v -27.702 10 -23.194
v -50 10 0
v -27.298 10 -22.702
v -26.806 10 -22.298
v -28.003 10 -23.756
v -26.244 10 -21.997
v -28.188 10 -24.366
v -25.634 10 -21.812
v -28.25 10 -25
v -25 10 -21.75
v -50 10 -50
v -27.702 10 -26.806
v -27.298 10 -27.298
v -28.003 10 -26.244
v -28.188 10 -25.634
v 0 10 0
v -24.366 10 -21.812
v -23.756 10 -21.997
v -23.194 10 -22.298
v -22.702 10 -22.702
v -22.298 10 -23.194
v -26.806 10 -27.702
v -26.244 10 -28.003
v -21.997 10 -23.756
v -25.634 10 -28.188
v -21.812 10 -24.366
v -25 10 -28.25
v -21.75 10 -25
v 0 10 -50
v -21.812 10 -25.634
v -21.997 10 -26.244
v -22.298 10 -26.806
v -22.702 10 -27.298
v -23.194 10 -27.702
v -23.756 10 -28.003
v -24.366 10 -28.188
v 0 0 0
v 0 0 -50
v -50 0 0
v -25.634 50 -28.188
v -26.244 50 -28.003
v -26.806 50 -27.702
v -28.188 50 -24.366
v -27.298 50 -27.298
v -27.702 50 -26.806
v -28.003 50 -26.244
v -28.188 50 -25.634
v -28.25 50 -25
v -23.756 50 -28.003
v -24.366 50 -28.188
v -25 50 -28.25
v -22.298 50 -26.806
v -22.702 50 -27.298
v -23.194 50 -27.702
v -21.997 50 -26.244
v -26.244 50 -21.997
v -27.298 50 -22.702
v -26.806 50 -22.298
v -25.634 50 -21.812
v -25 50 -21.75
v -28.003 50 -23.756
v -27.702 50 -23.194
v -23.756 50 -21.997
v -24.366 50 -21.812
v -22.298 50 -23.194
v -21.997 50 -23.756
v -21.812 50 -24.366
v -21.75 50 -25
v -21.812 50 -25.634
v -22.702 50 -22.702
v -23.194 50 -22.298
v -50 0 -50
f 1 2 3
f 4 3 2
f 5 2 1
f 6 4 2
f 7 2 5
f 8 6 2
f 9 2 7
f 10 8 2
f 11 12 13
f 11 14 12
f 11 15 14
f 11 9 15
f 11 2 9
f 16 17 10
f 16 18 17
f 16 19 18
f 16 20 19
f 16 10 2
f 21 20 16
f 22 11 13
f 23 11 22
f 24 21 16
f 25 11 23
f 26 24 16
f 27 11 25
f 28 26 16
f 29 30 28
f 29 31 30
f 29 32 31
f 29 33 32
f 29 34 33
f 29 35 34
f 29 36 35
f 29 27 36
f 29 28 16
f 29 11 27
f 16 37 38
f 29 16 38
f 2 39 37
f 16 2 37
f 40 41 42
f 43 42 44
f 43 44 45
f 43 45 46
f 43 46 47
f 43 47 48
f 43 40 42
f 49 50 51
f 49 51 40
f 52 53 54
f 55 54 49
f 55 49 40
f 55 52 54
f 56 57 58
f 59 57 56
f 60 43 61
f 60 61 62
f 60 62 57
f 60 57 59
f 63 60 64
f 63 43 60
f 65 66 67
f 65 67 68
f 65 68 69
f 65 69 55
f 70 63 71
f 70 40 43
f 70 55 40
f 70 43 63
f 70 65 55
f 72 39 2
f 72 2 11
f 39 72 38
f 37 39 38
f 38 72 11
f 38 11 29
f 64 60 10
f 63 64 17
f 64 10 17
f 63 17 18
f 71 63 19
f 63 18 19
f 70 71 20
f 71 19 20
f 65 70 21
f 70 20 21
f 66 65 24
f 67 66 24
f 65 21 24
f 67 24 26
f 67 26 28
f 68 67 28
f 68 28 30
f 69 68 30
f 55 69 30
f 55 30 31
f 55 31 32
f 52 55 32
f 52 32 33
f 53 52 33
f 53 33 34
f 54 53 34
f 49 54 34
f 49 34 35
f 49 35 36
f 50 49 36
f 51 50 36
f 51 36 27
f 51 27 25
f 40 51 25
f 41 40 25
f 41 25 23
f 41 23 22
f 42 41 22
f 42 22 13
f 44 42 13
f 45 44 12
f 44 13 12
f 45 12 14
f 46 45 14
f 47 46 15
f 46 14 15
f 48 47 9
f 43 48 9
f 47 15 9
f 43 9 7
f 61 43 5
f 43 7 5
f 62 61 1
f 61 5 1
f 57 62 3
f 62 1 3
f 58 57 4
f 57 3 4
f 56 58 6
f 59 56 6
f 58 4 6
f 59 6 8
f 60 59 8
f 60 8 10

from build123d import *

# Parameters (mm, degrees)
SKETCH1_R           = 3.25
BOSS_EXTRUDE2_DEPTH = 50
SKETCH1_5_W         = 50
SKETCH1_5_H         = 50
SKETCH1_5_R         = 3.25
BOSS_EXTRUDE3_DEPTH = 10


with BuildPart() as part:
    # Sketch1 → Boss-Extrude2 (new body)
    with BuildSketch(Plane(origin=(0, 0, 0), x_dir=(1, 0, 0), z_dir=(0, 1, 0))):
        with Locations((-25, 25)):
            Circle(SKETCH1_R)
    extrude(amount=BOSS_EXTRUDE2_DEPTH)

    # Sketch1<5> → Boss-Extrude3 (add)
    with BuildSketch(Plane(origin=(0, 0, 0), x_dir=(1, 0, 0), z_dir=(0, 1, 0))):
        with Locations((-25, 25)):
            Rectangle(SKETCH1_5_W, SKETCH1_5_H)
        with Locations((-25, 25)):
            Circle(SKETCH1_5_R, mode=Mode.SUBTRACT)
    extrude(amount=BOSS_EXTRUDE3_DEPTH)


solid = part.part
